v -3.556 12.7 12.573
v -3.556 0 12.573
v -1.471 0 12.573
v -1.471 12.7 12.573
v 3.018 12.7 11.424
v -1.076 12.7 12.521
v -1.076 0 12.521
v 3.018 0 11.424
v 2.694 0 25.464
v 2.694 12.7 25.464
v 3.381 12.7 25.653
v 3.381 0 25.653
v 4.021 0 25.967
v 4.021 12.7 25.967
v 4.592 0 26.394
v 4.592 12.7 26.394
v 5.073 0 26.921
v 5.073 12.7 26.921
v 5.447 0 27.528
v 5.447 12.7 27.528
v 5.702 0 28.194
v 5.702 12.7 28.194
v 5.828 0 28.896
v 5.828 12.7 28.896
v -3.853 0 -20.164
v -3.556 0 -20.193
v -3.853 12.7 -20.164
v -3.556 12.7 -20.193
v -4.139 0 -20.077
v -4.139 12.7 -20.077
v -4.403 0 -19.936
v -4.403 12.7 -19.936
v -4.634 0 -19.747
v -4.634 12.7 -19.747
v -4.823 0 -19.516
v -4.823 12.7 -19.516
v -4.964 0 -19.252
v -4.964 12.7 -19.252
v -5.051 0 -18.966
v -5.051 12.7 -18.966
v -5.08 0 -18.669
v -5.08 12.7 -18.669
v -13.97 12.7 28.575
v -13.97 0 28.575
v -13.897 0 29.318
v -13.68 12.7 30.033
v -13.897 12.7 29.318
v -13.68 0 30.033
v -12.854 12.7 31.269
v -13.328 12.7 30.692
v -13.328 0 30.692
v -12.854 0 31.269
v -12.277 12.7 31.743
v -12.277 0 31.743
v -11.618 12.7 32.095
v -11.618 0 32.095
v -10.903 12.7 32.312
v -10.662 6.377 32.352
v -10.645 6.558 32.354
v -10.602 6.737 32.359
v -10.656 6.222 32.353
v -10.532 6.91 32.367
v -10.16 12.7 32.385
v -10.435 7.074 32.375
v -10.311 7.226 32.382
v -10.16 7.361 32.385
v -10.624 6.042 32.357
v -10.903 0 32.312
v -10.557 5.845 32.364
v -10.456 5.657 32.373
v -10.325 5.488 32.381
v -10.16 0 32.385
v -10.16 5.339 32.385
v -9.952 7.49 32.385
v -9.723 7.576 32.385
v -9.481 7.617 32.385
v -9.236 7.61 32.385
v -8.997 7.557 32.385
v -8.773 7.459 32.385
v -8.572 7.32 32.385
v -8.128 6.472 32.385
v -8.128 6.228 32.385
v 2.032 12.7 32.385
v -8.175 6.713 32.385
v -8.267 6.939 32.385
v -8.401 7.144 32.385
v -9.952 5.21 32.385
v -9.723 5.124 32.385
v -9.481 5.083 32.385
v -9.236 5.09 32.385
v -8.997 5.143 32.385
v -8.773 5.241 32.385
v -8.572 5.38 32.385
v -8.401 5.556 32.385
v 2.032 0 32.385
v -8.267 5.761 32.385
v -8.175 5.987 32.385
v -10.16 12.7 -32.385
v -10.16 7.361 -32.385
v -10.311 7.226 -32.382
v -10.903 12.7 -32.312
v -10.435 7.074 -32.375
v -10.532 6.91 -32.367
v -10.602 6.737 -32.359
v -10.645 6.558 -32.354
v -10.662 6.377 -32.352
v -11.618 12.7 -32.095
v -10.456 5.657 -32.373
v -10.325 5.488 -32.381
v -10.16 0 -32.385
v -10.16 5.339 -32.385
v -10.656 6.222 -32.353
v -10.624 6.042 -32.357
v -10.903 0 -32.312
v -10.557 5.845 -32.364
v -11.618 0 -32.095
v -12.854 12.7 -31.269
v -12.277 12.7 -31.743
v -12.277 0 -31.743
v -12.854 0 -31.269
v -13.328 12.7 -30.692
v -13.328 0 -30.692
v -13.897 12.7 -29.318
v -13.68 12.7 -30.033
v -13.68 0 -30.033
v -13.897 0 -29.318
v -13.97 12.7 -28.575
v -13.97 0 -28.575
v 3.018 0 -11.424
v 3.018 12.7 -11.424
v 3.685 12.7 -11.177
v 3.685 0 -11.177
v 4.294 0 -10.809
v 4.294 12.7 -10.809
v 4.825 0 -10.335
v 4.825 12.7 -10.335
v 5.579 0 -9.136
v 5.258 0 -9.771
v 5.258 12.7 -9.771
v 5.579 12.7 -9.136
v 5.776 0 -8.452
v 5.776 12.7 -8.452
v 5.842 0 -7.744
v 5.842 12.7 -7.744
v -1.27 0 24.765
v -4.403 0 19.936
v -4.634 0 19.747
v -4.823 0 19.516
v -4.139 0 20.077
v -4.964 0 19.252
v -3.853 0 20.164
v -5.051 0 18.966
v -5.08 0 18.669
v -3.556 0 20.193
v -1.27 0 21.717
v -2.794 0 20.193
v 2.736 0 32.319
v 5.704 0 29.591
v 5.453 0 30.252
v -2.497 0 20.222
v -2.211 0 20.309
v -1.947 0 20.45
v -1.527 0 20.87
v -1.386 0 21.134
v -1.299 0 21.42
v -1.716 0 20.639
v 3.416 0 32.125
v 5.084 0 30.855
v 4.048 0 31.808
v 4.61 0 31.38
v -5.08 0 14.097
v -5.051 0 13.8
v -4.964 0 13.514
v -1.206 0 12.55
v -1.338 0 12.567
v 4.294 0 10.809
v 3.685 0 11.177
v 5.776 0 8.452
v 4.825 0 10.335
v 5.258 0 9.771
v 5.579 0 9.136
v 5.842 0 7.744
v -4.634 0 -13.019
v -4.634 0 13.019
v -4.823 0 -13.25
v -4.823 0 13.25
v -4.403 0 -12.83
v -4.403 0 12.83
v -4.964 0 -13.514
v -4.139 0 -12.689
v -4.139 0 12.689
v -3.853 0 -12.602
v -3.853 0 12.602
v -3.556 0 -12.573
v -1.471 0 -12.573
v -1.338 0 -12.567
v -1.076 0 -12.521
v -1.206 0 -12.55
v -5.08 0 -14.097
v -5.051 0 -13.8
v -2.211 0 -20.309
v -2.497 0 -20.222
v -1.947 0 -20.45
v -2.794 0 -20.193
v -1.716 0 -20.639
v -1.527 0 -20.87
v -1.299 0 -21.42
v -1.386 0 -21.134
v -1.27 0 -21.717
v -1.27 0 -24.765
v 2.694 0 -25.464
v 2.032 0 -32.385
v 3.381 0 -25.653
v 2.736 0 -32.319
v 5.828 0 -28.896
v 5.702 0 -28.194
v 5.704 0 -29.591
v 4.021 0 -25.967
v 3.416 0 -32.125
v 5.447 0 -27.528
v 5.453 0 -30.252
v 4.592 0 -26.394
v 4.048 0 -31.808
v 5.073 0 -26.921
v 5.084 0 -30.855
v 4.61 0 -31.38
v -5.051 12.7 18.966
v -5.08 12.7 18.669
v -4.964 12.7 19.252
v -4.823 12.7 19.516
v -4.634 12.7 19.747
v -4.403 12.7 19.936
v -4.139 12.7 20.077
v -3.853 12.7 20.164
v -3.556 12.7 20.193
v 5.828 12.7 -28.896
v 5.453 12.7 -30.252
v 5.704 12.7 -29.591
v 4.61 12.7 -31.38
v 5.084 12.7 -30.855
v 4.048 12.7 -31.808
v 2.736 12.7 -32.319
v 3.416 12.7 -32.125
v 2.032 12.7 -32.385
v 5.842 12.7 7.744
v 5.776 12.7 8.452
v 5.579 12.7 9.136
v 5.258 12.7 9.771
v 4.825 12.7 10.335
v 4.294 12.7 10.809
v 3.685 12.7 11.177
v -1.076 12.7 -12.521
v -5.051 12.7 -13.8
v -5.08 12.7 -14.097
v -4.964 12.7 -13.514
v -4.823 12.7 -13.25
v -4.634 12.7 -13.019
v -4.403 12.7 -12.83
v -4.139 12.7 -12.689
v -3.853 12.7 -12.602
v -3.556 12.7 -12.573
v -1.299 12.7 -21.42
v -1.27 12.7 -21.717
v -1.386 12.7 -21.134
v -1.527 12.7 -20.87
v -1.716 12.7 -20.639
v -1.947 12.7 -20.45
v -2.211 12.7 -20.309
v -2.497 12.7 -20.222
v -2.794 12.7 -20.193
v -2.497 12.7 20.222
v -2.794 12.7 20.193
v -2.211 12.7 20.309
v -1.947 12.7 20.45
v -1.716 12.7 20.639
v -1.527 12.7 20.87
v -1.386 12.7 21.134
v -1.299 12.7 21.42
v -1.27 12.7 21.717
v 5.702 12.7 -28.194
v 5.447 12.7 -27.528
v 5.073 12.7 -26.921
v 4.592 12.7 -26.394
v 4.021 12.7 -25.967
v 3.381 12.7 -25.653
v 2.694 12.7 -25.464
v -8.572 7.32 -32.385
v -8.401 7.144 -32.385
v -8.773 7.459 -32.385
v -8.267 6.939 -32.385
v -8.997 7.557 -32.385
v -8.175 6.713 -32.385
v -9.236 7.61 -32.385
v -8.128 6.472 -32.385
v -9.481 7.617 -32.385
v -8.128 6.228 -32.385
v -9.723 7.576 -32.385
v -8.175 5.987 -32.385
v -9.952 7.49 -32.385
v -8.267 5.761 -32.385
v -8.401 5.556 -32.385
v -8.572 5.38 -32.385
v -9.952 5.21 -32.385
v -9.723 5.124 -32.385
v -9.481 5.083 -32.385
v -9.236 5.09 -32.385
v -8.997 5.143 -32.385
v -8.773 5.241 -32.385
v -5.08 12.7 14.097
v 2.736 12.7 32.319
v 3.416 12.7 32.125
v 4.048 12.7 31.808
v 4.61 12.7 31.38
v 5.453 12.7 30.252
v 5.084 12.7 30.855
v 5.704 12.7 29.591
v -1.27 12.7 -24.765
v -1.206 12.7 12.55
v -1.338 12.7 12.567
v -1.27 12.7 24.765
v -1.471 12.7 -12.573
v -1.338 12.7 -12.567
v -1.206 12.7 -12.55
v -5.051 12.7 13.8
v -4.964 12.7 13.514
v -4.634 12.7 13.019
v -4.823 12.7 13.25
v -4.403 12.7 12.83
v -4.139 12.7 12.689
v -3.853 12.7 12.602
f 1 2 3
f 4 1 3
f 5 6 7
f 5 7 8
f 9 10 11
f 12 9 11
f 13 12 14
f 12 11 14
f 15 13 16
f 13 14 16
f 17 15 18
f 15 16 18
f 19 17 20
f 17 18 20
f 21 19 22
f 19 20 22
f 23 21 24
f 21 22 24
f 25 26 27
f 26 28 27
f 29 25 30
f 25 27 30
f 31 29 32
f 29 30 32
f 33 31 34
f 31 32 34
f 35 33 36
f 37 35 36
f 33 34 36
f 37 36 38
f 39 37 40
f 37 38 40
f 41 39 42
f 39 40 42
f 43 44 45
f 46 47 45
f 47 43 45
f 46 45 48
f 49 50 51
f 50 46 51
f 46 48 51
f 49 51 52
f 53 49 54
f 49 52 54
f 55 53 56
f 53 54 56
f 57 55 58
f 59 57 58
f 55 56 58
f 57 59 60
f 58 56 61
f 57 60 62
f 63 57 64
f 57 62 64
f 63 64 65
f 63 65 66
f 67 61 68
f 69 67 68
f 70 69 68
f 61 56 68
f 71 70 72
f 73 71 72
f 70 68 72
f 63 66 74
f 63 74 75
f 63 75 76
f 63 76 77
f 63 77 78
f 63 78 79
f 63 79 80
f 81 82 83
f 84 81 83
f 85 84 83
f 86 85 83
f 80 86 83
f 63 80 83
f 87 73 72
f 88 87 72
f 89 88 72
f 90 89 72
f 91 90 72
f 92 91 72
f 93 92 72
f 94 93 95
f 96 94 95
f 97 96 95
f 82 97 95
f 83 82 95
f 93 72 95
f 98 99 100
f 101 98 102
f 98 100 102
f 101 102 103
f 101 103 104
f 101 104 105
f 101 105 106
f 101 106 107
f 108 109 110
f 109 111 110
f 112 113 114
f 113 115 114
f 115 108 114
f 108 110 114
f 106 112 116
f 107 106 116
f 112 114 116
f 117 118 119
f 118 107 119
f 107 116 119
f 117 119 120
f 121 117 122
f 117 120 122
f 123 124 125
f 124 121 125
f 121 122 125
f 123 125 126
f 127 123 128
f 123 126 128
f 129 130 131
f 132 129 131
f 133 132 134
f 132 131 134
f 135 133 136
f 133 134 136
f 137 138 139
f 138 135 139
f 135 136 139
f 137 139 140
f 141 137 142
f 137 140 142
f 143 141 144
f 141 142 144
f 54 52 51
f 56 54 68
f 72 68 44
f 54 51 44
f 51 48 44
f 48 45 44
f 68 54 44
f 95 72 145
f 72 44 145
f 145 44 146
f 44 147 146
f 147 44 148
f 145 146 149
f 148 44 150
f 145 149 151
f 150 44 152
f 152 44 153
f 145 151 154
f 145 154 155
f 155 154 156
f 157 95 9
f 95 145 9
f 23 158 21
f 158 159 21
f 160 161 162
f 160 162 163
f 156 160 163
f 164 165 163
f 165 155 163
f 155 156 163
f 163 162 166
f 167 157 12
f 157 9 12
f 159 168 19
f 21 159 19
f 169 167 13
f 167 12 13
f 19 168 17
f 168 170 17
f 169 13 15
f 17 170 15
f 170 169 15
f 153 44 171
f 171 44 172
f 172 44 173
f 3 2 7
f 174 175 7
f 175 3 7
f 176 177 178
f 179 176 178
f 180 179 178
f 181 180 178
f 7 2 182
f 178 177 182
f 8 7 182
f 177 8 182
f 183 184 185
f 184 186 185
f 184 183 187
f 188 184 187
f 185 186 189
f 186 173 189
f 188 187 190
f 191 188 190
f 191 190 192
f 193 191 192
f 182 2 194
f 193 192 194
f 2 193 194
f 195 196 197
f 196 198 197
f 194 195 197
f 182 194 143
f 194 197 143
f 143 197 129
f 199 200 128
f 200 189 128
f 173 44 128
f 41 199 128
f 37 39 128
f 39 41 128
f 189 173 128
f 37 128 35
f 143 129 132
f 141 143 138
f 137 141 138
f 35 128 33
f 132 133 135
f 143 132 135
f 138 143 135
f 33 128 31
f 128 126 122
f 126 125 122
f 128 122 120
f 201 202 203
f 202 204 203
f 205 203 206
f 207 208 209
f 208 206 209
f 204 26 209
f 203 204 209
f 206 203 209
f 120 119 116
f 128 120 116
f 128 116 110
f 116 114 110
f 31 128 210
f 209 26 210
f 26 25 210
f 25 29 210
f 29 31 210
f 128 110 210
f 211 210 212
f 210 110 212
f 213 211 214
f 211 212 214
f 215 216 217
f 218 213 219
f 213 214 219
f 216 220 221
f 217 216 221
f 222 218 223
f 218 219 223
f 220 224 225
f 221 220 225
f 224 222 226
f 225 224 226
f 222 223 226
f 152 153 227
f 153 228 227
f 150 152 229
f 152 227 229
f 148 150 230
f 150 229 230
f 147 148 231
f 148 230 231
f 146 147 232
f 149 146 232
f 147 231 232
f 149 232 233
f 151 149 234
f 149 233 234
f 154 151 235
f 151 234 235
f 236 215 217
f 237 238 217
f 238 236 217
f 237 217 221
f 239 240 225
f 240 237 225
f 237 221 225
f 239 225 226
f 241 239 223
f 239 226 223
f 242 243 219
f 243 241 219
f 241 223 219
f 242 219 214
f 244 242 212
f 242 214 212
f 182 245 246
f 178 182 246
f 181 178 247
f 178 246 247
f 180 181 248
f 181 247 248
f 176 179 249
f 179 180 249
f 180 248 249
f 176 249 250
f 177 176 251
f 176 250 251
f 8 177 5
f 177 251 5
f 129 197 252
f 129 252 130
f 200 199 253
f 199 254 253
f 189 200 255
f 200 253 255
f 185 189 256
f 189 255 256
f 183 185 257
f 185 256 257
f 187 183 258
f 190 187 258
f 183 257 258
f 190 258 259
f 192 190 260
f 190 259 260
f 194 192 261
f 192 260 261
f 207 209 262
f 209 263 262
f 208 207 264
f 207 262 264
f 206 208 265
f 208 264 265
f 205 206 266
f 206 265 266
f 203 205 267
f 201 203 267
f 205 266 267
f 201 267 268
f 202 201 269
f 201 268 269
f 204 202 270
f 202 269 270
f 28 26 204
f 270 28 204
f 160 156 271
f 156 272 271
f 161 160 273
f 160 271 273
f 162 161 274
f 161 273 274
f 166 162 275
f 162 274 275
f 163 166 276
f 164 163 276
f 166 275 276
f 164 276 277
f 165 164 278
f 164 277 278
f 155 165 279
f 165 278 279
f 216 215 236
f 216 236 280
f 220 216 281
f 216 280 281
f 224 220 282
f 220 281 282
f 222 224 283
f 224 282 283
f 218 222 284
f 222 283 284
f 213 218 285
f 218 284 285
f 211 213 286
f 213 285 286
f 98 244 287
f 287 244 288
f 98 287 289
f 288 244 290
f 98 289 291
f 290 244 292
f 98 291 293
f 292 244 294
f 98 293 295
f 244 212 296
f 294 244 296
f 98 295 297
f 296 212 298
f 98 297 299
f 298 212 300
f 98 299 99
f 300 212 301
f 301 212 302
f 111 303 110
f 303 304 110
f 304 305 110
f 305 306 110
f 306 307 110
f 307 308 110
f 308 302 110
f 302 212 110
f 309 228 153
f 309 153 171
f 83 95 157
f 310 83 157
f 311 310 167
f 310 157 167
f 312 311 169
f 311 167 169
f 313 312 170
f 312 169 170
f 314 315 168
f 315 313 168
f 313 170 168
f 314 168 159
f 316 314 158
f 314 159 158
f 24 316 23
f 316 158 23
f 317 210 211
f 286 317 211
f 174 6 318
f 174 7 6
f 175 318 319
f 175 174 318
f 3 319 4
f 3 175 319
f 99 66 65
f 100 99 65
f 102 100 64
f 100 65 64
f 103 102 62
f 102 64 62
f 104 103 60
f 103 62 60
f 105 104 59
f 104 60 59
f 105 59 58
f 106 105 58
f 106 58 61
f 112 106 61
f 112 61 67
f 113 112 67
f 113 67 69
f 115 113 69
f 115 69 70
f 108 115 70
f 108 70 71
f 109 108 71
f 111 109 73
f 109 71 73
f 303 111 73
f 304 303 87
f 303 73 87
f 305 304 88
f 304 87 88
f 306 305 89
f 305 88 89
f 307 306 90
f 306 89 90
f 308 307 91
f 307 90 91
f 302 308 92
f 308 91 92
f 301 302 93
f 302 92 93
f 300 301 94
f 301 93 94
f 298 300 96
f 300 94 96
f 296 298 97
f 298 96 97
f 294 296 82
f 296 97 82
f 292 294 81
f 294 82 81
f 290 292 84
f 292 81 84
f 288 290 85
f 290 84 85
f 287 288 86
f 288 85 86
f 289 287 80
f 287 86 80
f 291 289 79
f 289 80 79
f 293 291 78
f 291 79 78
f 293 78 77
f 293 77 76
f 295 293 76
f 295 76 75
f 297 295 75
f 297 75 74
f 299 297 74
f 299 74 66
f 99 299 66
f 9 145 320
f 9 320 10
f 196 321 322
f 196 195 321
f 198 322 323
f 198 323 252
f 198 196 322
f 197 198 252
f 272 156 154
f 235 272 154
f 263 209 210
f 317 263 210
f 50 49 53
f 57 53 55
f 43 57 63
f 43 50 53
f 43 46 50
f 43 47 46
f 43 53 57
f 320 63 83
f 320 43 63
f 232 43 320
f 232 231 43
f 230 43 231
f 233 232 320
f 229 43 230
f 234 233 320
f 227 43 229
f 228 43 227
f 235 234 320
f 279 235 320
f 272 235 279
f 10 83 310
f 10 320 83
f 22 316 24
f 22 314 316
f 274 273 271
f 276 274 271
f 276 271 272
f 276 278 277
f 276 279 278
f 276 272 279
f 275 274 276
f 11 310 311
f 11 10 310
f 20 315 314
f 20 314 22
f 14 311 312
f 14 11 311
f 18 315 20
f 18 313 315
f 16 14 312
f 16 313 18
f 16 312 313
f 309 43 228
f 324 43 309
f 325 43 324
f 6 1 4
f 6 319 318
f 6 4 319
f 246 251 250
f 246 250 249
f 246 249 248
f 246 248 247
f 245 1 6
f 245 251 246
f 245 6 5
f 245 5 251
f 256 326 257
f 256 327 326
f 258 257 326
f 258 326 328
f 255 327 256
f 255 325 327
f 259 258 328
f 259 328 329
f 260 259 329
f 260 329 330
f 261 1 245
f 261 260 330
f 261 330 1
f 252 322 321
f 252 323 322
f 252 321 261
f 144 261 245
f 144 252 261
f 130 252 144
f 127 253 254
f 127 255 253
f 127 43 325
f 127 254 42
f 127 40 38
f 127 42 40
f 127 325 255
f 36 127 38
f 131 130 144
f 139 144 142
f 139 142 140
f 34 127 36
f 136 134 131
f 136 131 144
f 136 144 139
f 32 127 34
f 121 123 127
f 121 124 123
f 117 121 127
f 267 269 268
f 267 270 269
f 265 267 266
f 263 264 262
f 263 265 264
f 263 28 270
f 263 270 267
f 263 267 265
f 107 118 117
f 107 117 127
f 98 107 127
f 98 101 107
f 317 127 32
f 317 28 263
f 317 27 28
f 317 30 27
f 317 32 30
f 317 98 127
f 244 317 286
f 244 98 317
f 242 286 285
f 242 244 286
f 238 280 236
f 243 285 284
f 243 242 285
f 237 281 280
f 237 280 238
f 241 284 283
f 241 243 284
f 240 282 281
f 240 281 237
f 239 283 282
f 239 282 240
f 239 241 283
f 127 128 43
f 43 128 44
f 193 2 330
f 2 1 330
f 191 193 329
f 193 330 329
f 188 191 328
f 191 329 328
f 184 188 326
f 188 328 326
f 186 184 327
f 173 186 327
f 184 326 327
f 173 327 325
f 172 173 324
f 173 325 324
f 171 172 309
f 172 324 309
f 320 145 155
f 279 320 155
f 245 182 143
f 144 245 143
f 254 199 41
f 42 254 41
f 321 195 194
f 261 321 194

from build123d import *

# Parameters (mm, degrees)
BOSS_EXTRUDE1_DEPTH = 12.7
CUT_EXTRUDE1_DEPTH  = 38.486519244
FILLET4_R           = 1.524
FILLET5_R           = 3.81
SKETCH3_R           = 1.27
CUT_EXTRUDE2_DEPTH  = 68.465574925


with BuildPart() as part:
    # Sketch1 → Boss-Extrude1 (new body)
    with BuildSketch(Plane(origin=(0, 0, 0), x_dir=(1, 0, 0), z_dir=(0, 1, 0))):
        Polygon((5.842, 32.385), (-13.97, 32.385), (-13.97, -32.385), (5.842, -32.385), (5.842, -24.765), (-1.27, -24.765), (-1.27, -20.193), (-5.08, -20.193), (-5.08, -12.573), (-1.27, -12.573), (5.842, -12.573), (5.842, 12.573), (-1.27, 12.573), (-5.08, 12.573), (-5.08, 20.193), (-1.27, 20.193), (-1.27, 24.765), (5.842, 24.765), align=None)
    extrude(amount=BOSS_EXTRUDE1_DEPTH)

    # Sketch2 → Cut-Extrude1 (cut, through all)
    with BuildSketch(Plane(origin=(0, 12.7, 0), x_dir=(1, 0, 0), z_dir=(0, 1, 0))):
        Polygon((-1.27, 24.765), (5.842, 26.019037487), (5.842, 24.765), align=None)
        Polygon((-1.27, -24.765), (5.842, -26.019037487), (5.842, -24.765), align=None)
        Polygon((-1.27, -12.573), (5.842, -10.667345343), (5.842, -12.573), align=None)
        Polygon((-1.27, 12.573), (5.842, 10.667345343), (5.842, 12.573), align=None)
    extrude(amount=-CUT_EXTRUDE1_DEPTH, mode=Mode.SUBTRACT)

    # Fillet4
    fillet4_edges = [part.edges().sort_by_distance(p)[0] for p in [
        (-5.08, 6.35, 20.193),
        (-1.27, 6.35, 20.193),
        (-1.27, 6.35, -20.193),
        (-5.08, 6.35, -20.193),
        (-5.08, 6.35, -12.573),
        (-5.08, 6.35, 12.573),
        (-1.27, 6.35, 12.573),
        (-1.27, 6.35, -12.573),
    ]]
    fillet(fillet4_edges, radius=FILLET4_R)

    # Fillet5
    # the kernel refuses this fillet: 3.81 mm, written as the material it takes off along each edge
    with BuildSketch(Plane(origin=(5.842, -9.525, 32.385), x_dir=(-1, 0, 0), z_dir=(0, 1, 0)), Plane(origin=(-13.97, -9.525, 32.385), x_dir=(0, 0, -1), z_dir=(0, 1, 0)), Plane(origin=(-13.97, -9.525, -32.385), x_dir=(1, 0, 0), z_dir=(0, 1, 0)), Plane(origin=(5.842, -9.525, -32.385), x_dir=(0, 0, 1), z_dir=(0, 1, 0))) as fillet5_piece_1:
        with BuildLine():
            CenterArc((FILLET5_R, -FILLET5_R), FILLET5_R, 90, 90)
            Line((0, -FILLET5_R), (0, 0))
            Line((0, 0), (FILLET5_R, 0))
        make_face()
    extrude(amount=31.75, mode=Mode.SUBTRACT)
    with BuildSketch(Plane(origin=(5.842, 20.692423987, -26.019037487), x_dir=(-0.9848077530122095, 0, 0.17364817766692292), z_dir=(0, -1, 0)), Plane(origin=(5.842, 20.692423987, 26.019037487), x_dir=(0, 0, 1), z_dir=(0, -1, 0))) as fillet5_piece_2:
        with BuildLine():
            CenterArc((FILLET5_R * 0.839099631177, FILLET5_R), FILLET5_R, 190, 80)
            Line((-FILLET5_R * 0.145708121835, FILLET5_R * 0.826351822333), (0, 0))
            Line((0, 0), (FILLET5_R * 0.839099631177, 0))
        make_face()
    extrude(amount=28.684847974, mode=Mode.SUBTRACT)
    with BuildSketch(Plane(origin=(5.842, 20.00878956, 10.667345343), x_dir=(0, 0, -1), z_dir=(0, -1, 0)), Plane(origin=(5.842, 20.00878956, -10.667345343), x_dir=(-0.9659258262890701, 0, -0.258819045102514), z_dir=(0, -1, 0))) as fillet5_piece_3:
        with BuildLine():
            CenterArc((FILLET5_R * 0.767326987979, -FILLET5_R), FILLET5_R, 90, 75)
            Line((-FILLET5_R * 0.19859883831, -FILLET5_R * 0.741180954897), (0, 0))
            Line((0, 0), (FILLET5_R * 0.767326987979, 0))
        make_face()
    extrude(amount=27.317579121, mode=Mode.SUBTRACT)

    # Sketch3 → Cut-Extrude2 (cut, through all)
    with BuildSketch(Plane.XY.offset(32.385)):
        with Locations(Location((-9.391956596, 6.35, 0), (0, 0, 127.211471896))):
            Circle(SKETCH3_R)
    extrude(amount=-CUT_EXTRUDE2_DEPTH, mode=Mode.SUBTRACT)


solid = part.part
